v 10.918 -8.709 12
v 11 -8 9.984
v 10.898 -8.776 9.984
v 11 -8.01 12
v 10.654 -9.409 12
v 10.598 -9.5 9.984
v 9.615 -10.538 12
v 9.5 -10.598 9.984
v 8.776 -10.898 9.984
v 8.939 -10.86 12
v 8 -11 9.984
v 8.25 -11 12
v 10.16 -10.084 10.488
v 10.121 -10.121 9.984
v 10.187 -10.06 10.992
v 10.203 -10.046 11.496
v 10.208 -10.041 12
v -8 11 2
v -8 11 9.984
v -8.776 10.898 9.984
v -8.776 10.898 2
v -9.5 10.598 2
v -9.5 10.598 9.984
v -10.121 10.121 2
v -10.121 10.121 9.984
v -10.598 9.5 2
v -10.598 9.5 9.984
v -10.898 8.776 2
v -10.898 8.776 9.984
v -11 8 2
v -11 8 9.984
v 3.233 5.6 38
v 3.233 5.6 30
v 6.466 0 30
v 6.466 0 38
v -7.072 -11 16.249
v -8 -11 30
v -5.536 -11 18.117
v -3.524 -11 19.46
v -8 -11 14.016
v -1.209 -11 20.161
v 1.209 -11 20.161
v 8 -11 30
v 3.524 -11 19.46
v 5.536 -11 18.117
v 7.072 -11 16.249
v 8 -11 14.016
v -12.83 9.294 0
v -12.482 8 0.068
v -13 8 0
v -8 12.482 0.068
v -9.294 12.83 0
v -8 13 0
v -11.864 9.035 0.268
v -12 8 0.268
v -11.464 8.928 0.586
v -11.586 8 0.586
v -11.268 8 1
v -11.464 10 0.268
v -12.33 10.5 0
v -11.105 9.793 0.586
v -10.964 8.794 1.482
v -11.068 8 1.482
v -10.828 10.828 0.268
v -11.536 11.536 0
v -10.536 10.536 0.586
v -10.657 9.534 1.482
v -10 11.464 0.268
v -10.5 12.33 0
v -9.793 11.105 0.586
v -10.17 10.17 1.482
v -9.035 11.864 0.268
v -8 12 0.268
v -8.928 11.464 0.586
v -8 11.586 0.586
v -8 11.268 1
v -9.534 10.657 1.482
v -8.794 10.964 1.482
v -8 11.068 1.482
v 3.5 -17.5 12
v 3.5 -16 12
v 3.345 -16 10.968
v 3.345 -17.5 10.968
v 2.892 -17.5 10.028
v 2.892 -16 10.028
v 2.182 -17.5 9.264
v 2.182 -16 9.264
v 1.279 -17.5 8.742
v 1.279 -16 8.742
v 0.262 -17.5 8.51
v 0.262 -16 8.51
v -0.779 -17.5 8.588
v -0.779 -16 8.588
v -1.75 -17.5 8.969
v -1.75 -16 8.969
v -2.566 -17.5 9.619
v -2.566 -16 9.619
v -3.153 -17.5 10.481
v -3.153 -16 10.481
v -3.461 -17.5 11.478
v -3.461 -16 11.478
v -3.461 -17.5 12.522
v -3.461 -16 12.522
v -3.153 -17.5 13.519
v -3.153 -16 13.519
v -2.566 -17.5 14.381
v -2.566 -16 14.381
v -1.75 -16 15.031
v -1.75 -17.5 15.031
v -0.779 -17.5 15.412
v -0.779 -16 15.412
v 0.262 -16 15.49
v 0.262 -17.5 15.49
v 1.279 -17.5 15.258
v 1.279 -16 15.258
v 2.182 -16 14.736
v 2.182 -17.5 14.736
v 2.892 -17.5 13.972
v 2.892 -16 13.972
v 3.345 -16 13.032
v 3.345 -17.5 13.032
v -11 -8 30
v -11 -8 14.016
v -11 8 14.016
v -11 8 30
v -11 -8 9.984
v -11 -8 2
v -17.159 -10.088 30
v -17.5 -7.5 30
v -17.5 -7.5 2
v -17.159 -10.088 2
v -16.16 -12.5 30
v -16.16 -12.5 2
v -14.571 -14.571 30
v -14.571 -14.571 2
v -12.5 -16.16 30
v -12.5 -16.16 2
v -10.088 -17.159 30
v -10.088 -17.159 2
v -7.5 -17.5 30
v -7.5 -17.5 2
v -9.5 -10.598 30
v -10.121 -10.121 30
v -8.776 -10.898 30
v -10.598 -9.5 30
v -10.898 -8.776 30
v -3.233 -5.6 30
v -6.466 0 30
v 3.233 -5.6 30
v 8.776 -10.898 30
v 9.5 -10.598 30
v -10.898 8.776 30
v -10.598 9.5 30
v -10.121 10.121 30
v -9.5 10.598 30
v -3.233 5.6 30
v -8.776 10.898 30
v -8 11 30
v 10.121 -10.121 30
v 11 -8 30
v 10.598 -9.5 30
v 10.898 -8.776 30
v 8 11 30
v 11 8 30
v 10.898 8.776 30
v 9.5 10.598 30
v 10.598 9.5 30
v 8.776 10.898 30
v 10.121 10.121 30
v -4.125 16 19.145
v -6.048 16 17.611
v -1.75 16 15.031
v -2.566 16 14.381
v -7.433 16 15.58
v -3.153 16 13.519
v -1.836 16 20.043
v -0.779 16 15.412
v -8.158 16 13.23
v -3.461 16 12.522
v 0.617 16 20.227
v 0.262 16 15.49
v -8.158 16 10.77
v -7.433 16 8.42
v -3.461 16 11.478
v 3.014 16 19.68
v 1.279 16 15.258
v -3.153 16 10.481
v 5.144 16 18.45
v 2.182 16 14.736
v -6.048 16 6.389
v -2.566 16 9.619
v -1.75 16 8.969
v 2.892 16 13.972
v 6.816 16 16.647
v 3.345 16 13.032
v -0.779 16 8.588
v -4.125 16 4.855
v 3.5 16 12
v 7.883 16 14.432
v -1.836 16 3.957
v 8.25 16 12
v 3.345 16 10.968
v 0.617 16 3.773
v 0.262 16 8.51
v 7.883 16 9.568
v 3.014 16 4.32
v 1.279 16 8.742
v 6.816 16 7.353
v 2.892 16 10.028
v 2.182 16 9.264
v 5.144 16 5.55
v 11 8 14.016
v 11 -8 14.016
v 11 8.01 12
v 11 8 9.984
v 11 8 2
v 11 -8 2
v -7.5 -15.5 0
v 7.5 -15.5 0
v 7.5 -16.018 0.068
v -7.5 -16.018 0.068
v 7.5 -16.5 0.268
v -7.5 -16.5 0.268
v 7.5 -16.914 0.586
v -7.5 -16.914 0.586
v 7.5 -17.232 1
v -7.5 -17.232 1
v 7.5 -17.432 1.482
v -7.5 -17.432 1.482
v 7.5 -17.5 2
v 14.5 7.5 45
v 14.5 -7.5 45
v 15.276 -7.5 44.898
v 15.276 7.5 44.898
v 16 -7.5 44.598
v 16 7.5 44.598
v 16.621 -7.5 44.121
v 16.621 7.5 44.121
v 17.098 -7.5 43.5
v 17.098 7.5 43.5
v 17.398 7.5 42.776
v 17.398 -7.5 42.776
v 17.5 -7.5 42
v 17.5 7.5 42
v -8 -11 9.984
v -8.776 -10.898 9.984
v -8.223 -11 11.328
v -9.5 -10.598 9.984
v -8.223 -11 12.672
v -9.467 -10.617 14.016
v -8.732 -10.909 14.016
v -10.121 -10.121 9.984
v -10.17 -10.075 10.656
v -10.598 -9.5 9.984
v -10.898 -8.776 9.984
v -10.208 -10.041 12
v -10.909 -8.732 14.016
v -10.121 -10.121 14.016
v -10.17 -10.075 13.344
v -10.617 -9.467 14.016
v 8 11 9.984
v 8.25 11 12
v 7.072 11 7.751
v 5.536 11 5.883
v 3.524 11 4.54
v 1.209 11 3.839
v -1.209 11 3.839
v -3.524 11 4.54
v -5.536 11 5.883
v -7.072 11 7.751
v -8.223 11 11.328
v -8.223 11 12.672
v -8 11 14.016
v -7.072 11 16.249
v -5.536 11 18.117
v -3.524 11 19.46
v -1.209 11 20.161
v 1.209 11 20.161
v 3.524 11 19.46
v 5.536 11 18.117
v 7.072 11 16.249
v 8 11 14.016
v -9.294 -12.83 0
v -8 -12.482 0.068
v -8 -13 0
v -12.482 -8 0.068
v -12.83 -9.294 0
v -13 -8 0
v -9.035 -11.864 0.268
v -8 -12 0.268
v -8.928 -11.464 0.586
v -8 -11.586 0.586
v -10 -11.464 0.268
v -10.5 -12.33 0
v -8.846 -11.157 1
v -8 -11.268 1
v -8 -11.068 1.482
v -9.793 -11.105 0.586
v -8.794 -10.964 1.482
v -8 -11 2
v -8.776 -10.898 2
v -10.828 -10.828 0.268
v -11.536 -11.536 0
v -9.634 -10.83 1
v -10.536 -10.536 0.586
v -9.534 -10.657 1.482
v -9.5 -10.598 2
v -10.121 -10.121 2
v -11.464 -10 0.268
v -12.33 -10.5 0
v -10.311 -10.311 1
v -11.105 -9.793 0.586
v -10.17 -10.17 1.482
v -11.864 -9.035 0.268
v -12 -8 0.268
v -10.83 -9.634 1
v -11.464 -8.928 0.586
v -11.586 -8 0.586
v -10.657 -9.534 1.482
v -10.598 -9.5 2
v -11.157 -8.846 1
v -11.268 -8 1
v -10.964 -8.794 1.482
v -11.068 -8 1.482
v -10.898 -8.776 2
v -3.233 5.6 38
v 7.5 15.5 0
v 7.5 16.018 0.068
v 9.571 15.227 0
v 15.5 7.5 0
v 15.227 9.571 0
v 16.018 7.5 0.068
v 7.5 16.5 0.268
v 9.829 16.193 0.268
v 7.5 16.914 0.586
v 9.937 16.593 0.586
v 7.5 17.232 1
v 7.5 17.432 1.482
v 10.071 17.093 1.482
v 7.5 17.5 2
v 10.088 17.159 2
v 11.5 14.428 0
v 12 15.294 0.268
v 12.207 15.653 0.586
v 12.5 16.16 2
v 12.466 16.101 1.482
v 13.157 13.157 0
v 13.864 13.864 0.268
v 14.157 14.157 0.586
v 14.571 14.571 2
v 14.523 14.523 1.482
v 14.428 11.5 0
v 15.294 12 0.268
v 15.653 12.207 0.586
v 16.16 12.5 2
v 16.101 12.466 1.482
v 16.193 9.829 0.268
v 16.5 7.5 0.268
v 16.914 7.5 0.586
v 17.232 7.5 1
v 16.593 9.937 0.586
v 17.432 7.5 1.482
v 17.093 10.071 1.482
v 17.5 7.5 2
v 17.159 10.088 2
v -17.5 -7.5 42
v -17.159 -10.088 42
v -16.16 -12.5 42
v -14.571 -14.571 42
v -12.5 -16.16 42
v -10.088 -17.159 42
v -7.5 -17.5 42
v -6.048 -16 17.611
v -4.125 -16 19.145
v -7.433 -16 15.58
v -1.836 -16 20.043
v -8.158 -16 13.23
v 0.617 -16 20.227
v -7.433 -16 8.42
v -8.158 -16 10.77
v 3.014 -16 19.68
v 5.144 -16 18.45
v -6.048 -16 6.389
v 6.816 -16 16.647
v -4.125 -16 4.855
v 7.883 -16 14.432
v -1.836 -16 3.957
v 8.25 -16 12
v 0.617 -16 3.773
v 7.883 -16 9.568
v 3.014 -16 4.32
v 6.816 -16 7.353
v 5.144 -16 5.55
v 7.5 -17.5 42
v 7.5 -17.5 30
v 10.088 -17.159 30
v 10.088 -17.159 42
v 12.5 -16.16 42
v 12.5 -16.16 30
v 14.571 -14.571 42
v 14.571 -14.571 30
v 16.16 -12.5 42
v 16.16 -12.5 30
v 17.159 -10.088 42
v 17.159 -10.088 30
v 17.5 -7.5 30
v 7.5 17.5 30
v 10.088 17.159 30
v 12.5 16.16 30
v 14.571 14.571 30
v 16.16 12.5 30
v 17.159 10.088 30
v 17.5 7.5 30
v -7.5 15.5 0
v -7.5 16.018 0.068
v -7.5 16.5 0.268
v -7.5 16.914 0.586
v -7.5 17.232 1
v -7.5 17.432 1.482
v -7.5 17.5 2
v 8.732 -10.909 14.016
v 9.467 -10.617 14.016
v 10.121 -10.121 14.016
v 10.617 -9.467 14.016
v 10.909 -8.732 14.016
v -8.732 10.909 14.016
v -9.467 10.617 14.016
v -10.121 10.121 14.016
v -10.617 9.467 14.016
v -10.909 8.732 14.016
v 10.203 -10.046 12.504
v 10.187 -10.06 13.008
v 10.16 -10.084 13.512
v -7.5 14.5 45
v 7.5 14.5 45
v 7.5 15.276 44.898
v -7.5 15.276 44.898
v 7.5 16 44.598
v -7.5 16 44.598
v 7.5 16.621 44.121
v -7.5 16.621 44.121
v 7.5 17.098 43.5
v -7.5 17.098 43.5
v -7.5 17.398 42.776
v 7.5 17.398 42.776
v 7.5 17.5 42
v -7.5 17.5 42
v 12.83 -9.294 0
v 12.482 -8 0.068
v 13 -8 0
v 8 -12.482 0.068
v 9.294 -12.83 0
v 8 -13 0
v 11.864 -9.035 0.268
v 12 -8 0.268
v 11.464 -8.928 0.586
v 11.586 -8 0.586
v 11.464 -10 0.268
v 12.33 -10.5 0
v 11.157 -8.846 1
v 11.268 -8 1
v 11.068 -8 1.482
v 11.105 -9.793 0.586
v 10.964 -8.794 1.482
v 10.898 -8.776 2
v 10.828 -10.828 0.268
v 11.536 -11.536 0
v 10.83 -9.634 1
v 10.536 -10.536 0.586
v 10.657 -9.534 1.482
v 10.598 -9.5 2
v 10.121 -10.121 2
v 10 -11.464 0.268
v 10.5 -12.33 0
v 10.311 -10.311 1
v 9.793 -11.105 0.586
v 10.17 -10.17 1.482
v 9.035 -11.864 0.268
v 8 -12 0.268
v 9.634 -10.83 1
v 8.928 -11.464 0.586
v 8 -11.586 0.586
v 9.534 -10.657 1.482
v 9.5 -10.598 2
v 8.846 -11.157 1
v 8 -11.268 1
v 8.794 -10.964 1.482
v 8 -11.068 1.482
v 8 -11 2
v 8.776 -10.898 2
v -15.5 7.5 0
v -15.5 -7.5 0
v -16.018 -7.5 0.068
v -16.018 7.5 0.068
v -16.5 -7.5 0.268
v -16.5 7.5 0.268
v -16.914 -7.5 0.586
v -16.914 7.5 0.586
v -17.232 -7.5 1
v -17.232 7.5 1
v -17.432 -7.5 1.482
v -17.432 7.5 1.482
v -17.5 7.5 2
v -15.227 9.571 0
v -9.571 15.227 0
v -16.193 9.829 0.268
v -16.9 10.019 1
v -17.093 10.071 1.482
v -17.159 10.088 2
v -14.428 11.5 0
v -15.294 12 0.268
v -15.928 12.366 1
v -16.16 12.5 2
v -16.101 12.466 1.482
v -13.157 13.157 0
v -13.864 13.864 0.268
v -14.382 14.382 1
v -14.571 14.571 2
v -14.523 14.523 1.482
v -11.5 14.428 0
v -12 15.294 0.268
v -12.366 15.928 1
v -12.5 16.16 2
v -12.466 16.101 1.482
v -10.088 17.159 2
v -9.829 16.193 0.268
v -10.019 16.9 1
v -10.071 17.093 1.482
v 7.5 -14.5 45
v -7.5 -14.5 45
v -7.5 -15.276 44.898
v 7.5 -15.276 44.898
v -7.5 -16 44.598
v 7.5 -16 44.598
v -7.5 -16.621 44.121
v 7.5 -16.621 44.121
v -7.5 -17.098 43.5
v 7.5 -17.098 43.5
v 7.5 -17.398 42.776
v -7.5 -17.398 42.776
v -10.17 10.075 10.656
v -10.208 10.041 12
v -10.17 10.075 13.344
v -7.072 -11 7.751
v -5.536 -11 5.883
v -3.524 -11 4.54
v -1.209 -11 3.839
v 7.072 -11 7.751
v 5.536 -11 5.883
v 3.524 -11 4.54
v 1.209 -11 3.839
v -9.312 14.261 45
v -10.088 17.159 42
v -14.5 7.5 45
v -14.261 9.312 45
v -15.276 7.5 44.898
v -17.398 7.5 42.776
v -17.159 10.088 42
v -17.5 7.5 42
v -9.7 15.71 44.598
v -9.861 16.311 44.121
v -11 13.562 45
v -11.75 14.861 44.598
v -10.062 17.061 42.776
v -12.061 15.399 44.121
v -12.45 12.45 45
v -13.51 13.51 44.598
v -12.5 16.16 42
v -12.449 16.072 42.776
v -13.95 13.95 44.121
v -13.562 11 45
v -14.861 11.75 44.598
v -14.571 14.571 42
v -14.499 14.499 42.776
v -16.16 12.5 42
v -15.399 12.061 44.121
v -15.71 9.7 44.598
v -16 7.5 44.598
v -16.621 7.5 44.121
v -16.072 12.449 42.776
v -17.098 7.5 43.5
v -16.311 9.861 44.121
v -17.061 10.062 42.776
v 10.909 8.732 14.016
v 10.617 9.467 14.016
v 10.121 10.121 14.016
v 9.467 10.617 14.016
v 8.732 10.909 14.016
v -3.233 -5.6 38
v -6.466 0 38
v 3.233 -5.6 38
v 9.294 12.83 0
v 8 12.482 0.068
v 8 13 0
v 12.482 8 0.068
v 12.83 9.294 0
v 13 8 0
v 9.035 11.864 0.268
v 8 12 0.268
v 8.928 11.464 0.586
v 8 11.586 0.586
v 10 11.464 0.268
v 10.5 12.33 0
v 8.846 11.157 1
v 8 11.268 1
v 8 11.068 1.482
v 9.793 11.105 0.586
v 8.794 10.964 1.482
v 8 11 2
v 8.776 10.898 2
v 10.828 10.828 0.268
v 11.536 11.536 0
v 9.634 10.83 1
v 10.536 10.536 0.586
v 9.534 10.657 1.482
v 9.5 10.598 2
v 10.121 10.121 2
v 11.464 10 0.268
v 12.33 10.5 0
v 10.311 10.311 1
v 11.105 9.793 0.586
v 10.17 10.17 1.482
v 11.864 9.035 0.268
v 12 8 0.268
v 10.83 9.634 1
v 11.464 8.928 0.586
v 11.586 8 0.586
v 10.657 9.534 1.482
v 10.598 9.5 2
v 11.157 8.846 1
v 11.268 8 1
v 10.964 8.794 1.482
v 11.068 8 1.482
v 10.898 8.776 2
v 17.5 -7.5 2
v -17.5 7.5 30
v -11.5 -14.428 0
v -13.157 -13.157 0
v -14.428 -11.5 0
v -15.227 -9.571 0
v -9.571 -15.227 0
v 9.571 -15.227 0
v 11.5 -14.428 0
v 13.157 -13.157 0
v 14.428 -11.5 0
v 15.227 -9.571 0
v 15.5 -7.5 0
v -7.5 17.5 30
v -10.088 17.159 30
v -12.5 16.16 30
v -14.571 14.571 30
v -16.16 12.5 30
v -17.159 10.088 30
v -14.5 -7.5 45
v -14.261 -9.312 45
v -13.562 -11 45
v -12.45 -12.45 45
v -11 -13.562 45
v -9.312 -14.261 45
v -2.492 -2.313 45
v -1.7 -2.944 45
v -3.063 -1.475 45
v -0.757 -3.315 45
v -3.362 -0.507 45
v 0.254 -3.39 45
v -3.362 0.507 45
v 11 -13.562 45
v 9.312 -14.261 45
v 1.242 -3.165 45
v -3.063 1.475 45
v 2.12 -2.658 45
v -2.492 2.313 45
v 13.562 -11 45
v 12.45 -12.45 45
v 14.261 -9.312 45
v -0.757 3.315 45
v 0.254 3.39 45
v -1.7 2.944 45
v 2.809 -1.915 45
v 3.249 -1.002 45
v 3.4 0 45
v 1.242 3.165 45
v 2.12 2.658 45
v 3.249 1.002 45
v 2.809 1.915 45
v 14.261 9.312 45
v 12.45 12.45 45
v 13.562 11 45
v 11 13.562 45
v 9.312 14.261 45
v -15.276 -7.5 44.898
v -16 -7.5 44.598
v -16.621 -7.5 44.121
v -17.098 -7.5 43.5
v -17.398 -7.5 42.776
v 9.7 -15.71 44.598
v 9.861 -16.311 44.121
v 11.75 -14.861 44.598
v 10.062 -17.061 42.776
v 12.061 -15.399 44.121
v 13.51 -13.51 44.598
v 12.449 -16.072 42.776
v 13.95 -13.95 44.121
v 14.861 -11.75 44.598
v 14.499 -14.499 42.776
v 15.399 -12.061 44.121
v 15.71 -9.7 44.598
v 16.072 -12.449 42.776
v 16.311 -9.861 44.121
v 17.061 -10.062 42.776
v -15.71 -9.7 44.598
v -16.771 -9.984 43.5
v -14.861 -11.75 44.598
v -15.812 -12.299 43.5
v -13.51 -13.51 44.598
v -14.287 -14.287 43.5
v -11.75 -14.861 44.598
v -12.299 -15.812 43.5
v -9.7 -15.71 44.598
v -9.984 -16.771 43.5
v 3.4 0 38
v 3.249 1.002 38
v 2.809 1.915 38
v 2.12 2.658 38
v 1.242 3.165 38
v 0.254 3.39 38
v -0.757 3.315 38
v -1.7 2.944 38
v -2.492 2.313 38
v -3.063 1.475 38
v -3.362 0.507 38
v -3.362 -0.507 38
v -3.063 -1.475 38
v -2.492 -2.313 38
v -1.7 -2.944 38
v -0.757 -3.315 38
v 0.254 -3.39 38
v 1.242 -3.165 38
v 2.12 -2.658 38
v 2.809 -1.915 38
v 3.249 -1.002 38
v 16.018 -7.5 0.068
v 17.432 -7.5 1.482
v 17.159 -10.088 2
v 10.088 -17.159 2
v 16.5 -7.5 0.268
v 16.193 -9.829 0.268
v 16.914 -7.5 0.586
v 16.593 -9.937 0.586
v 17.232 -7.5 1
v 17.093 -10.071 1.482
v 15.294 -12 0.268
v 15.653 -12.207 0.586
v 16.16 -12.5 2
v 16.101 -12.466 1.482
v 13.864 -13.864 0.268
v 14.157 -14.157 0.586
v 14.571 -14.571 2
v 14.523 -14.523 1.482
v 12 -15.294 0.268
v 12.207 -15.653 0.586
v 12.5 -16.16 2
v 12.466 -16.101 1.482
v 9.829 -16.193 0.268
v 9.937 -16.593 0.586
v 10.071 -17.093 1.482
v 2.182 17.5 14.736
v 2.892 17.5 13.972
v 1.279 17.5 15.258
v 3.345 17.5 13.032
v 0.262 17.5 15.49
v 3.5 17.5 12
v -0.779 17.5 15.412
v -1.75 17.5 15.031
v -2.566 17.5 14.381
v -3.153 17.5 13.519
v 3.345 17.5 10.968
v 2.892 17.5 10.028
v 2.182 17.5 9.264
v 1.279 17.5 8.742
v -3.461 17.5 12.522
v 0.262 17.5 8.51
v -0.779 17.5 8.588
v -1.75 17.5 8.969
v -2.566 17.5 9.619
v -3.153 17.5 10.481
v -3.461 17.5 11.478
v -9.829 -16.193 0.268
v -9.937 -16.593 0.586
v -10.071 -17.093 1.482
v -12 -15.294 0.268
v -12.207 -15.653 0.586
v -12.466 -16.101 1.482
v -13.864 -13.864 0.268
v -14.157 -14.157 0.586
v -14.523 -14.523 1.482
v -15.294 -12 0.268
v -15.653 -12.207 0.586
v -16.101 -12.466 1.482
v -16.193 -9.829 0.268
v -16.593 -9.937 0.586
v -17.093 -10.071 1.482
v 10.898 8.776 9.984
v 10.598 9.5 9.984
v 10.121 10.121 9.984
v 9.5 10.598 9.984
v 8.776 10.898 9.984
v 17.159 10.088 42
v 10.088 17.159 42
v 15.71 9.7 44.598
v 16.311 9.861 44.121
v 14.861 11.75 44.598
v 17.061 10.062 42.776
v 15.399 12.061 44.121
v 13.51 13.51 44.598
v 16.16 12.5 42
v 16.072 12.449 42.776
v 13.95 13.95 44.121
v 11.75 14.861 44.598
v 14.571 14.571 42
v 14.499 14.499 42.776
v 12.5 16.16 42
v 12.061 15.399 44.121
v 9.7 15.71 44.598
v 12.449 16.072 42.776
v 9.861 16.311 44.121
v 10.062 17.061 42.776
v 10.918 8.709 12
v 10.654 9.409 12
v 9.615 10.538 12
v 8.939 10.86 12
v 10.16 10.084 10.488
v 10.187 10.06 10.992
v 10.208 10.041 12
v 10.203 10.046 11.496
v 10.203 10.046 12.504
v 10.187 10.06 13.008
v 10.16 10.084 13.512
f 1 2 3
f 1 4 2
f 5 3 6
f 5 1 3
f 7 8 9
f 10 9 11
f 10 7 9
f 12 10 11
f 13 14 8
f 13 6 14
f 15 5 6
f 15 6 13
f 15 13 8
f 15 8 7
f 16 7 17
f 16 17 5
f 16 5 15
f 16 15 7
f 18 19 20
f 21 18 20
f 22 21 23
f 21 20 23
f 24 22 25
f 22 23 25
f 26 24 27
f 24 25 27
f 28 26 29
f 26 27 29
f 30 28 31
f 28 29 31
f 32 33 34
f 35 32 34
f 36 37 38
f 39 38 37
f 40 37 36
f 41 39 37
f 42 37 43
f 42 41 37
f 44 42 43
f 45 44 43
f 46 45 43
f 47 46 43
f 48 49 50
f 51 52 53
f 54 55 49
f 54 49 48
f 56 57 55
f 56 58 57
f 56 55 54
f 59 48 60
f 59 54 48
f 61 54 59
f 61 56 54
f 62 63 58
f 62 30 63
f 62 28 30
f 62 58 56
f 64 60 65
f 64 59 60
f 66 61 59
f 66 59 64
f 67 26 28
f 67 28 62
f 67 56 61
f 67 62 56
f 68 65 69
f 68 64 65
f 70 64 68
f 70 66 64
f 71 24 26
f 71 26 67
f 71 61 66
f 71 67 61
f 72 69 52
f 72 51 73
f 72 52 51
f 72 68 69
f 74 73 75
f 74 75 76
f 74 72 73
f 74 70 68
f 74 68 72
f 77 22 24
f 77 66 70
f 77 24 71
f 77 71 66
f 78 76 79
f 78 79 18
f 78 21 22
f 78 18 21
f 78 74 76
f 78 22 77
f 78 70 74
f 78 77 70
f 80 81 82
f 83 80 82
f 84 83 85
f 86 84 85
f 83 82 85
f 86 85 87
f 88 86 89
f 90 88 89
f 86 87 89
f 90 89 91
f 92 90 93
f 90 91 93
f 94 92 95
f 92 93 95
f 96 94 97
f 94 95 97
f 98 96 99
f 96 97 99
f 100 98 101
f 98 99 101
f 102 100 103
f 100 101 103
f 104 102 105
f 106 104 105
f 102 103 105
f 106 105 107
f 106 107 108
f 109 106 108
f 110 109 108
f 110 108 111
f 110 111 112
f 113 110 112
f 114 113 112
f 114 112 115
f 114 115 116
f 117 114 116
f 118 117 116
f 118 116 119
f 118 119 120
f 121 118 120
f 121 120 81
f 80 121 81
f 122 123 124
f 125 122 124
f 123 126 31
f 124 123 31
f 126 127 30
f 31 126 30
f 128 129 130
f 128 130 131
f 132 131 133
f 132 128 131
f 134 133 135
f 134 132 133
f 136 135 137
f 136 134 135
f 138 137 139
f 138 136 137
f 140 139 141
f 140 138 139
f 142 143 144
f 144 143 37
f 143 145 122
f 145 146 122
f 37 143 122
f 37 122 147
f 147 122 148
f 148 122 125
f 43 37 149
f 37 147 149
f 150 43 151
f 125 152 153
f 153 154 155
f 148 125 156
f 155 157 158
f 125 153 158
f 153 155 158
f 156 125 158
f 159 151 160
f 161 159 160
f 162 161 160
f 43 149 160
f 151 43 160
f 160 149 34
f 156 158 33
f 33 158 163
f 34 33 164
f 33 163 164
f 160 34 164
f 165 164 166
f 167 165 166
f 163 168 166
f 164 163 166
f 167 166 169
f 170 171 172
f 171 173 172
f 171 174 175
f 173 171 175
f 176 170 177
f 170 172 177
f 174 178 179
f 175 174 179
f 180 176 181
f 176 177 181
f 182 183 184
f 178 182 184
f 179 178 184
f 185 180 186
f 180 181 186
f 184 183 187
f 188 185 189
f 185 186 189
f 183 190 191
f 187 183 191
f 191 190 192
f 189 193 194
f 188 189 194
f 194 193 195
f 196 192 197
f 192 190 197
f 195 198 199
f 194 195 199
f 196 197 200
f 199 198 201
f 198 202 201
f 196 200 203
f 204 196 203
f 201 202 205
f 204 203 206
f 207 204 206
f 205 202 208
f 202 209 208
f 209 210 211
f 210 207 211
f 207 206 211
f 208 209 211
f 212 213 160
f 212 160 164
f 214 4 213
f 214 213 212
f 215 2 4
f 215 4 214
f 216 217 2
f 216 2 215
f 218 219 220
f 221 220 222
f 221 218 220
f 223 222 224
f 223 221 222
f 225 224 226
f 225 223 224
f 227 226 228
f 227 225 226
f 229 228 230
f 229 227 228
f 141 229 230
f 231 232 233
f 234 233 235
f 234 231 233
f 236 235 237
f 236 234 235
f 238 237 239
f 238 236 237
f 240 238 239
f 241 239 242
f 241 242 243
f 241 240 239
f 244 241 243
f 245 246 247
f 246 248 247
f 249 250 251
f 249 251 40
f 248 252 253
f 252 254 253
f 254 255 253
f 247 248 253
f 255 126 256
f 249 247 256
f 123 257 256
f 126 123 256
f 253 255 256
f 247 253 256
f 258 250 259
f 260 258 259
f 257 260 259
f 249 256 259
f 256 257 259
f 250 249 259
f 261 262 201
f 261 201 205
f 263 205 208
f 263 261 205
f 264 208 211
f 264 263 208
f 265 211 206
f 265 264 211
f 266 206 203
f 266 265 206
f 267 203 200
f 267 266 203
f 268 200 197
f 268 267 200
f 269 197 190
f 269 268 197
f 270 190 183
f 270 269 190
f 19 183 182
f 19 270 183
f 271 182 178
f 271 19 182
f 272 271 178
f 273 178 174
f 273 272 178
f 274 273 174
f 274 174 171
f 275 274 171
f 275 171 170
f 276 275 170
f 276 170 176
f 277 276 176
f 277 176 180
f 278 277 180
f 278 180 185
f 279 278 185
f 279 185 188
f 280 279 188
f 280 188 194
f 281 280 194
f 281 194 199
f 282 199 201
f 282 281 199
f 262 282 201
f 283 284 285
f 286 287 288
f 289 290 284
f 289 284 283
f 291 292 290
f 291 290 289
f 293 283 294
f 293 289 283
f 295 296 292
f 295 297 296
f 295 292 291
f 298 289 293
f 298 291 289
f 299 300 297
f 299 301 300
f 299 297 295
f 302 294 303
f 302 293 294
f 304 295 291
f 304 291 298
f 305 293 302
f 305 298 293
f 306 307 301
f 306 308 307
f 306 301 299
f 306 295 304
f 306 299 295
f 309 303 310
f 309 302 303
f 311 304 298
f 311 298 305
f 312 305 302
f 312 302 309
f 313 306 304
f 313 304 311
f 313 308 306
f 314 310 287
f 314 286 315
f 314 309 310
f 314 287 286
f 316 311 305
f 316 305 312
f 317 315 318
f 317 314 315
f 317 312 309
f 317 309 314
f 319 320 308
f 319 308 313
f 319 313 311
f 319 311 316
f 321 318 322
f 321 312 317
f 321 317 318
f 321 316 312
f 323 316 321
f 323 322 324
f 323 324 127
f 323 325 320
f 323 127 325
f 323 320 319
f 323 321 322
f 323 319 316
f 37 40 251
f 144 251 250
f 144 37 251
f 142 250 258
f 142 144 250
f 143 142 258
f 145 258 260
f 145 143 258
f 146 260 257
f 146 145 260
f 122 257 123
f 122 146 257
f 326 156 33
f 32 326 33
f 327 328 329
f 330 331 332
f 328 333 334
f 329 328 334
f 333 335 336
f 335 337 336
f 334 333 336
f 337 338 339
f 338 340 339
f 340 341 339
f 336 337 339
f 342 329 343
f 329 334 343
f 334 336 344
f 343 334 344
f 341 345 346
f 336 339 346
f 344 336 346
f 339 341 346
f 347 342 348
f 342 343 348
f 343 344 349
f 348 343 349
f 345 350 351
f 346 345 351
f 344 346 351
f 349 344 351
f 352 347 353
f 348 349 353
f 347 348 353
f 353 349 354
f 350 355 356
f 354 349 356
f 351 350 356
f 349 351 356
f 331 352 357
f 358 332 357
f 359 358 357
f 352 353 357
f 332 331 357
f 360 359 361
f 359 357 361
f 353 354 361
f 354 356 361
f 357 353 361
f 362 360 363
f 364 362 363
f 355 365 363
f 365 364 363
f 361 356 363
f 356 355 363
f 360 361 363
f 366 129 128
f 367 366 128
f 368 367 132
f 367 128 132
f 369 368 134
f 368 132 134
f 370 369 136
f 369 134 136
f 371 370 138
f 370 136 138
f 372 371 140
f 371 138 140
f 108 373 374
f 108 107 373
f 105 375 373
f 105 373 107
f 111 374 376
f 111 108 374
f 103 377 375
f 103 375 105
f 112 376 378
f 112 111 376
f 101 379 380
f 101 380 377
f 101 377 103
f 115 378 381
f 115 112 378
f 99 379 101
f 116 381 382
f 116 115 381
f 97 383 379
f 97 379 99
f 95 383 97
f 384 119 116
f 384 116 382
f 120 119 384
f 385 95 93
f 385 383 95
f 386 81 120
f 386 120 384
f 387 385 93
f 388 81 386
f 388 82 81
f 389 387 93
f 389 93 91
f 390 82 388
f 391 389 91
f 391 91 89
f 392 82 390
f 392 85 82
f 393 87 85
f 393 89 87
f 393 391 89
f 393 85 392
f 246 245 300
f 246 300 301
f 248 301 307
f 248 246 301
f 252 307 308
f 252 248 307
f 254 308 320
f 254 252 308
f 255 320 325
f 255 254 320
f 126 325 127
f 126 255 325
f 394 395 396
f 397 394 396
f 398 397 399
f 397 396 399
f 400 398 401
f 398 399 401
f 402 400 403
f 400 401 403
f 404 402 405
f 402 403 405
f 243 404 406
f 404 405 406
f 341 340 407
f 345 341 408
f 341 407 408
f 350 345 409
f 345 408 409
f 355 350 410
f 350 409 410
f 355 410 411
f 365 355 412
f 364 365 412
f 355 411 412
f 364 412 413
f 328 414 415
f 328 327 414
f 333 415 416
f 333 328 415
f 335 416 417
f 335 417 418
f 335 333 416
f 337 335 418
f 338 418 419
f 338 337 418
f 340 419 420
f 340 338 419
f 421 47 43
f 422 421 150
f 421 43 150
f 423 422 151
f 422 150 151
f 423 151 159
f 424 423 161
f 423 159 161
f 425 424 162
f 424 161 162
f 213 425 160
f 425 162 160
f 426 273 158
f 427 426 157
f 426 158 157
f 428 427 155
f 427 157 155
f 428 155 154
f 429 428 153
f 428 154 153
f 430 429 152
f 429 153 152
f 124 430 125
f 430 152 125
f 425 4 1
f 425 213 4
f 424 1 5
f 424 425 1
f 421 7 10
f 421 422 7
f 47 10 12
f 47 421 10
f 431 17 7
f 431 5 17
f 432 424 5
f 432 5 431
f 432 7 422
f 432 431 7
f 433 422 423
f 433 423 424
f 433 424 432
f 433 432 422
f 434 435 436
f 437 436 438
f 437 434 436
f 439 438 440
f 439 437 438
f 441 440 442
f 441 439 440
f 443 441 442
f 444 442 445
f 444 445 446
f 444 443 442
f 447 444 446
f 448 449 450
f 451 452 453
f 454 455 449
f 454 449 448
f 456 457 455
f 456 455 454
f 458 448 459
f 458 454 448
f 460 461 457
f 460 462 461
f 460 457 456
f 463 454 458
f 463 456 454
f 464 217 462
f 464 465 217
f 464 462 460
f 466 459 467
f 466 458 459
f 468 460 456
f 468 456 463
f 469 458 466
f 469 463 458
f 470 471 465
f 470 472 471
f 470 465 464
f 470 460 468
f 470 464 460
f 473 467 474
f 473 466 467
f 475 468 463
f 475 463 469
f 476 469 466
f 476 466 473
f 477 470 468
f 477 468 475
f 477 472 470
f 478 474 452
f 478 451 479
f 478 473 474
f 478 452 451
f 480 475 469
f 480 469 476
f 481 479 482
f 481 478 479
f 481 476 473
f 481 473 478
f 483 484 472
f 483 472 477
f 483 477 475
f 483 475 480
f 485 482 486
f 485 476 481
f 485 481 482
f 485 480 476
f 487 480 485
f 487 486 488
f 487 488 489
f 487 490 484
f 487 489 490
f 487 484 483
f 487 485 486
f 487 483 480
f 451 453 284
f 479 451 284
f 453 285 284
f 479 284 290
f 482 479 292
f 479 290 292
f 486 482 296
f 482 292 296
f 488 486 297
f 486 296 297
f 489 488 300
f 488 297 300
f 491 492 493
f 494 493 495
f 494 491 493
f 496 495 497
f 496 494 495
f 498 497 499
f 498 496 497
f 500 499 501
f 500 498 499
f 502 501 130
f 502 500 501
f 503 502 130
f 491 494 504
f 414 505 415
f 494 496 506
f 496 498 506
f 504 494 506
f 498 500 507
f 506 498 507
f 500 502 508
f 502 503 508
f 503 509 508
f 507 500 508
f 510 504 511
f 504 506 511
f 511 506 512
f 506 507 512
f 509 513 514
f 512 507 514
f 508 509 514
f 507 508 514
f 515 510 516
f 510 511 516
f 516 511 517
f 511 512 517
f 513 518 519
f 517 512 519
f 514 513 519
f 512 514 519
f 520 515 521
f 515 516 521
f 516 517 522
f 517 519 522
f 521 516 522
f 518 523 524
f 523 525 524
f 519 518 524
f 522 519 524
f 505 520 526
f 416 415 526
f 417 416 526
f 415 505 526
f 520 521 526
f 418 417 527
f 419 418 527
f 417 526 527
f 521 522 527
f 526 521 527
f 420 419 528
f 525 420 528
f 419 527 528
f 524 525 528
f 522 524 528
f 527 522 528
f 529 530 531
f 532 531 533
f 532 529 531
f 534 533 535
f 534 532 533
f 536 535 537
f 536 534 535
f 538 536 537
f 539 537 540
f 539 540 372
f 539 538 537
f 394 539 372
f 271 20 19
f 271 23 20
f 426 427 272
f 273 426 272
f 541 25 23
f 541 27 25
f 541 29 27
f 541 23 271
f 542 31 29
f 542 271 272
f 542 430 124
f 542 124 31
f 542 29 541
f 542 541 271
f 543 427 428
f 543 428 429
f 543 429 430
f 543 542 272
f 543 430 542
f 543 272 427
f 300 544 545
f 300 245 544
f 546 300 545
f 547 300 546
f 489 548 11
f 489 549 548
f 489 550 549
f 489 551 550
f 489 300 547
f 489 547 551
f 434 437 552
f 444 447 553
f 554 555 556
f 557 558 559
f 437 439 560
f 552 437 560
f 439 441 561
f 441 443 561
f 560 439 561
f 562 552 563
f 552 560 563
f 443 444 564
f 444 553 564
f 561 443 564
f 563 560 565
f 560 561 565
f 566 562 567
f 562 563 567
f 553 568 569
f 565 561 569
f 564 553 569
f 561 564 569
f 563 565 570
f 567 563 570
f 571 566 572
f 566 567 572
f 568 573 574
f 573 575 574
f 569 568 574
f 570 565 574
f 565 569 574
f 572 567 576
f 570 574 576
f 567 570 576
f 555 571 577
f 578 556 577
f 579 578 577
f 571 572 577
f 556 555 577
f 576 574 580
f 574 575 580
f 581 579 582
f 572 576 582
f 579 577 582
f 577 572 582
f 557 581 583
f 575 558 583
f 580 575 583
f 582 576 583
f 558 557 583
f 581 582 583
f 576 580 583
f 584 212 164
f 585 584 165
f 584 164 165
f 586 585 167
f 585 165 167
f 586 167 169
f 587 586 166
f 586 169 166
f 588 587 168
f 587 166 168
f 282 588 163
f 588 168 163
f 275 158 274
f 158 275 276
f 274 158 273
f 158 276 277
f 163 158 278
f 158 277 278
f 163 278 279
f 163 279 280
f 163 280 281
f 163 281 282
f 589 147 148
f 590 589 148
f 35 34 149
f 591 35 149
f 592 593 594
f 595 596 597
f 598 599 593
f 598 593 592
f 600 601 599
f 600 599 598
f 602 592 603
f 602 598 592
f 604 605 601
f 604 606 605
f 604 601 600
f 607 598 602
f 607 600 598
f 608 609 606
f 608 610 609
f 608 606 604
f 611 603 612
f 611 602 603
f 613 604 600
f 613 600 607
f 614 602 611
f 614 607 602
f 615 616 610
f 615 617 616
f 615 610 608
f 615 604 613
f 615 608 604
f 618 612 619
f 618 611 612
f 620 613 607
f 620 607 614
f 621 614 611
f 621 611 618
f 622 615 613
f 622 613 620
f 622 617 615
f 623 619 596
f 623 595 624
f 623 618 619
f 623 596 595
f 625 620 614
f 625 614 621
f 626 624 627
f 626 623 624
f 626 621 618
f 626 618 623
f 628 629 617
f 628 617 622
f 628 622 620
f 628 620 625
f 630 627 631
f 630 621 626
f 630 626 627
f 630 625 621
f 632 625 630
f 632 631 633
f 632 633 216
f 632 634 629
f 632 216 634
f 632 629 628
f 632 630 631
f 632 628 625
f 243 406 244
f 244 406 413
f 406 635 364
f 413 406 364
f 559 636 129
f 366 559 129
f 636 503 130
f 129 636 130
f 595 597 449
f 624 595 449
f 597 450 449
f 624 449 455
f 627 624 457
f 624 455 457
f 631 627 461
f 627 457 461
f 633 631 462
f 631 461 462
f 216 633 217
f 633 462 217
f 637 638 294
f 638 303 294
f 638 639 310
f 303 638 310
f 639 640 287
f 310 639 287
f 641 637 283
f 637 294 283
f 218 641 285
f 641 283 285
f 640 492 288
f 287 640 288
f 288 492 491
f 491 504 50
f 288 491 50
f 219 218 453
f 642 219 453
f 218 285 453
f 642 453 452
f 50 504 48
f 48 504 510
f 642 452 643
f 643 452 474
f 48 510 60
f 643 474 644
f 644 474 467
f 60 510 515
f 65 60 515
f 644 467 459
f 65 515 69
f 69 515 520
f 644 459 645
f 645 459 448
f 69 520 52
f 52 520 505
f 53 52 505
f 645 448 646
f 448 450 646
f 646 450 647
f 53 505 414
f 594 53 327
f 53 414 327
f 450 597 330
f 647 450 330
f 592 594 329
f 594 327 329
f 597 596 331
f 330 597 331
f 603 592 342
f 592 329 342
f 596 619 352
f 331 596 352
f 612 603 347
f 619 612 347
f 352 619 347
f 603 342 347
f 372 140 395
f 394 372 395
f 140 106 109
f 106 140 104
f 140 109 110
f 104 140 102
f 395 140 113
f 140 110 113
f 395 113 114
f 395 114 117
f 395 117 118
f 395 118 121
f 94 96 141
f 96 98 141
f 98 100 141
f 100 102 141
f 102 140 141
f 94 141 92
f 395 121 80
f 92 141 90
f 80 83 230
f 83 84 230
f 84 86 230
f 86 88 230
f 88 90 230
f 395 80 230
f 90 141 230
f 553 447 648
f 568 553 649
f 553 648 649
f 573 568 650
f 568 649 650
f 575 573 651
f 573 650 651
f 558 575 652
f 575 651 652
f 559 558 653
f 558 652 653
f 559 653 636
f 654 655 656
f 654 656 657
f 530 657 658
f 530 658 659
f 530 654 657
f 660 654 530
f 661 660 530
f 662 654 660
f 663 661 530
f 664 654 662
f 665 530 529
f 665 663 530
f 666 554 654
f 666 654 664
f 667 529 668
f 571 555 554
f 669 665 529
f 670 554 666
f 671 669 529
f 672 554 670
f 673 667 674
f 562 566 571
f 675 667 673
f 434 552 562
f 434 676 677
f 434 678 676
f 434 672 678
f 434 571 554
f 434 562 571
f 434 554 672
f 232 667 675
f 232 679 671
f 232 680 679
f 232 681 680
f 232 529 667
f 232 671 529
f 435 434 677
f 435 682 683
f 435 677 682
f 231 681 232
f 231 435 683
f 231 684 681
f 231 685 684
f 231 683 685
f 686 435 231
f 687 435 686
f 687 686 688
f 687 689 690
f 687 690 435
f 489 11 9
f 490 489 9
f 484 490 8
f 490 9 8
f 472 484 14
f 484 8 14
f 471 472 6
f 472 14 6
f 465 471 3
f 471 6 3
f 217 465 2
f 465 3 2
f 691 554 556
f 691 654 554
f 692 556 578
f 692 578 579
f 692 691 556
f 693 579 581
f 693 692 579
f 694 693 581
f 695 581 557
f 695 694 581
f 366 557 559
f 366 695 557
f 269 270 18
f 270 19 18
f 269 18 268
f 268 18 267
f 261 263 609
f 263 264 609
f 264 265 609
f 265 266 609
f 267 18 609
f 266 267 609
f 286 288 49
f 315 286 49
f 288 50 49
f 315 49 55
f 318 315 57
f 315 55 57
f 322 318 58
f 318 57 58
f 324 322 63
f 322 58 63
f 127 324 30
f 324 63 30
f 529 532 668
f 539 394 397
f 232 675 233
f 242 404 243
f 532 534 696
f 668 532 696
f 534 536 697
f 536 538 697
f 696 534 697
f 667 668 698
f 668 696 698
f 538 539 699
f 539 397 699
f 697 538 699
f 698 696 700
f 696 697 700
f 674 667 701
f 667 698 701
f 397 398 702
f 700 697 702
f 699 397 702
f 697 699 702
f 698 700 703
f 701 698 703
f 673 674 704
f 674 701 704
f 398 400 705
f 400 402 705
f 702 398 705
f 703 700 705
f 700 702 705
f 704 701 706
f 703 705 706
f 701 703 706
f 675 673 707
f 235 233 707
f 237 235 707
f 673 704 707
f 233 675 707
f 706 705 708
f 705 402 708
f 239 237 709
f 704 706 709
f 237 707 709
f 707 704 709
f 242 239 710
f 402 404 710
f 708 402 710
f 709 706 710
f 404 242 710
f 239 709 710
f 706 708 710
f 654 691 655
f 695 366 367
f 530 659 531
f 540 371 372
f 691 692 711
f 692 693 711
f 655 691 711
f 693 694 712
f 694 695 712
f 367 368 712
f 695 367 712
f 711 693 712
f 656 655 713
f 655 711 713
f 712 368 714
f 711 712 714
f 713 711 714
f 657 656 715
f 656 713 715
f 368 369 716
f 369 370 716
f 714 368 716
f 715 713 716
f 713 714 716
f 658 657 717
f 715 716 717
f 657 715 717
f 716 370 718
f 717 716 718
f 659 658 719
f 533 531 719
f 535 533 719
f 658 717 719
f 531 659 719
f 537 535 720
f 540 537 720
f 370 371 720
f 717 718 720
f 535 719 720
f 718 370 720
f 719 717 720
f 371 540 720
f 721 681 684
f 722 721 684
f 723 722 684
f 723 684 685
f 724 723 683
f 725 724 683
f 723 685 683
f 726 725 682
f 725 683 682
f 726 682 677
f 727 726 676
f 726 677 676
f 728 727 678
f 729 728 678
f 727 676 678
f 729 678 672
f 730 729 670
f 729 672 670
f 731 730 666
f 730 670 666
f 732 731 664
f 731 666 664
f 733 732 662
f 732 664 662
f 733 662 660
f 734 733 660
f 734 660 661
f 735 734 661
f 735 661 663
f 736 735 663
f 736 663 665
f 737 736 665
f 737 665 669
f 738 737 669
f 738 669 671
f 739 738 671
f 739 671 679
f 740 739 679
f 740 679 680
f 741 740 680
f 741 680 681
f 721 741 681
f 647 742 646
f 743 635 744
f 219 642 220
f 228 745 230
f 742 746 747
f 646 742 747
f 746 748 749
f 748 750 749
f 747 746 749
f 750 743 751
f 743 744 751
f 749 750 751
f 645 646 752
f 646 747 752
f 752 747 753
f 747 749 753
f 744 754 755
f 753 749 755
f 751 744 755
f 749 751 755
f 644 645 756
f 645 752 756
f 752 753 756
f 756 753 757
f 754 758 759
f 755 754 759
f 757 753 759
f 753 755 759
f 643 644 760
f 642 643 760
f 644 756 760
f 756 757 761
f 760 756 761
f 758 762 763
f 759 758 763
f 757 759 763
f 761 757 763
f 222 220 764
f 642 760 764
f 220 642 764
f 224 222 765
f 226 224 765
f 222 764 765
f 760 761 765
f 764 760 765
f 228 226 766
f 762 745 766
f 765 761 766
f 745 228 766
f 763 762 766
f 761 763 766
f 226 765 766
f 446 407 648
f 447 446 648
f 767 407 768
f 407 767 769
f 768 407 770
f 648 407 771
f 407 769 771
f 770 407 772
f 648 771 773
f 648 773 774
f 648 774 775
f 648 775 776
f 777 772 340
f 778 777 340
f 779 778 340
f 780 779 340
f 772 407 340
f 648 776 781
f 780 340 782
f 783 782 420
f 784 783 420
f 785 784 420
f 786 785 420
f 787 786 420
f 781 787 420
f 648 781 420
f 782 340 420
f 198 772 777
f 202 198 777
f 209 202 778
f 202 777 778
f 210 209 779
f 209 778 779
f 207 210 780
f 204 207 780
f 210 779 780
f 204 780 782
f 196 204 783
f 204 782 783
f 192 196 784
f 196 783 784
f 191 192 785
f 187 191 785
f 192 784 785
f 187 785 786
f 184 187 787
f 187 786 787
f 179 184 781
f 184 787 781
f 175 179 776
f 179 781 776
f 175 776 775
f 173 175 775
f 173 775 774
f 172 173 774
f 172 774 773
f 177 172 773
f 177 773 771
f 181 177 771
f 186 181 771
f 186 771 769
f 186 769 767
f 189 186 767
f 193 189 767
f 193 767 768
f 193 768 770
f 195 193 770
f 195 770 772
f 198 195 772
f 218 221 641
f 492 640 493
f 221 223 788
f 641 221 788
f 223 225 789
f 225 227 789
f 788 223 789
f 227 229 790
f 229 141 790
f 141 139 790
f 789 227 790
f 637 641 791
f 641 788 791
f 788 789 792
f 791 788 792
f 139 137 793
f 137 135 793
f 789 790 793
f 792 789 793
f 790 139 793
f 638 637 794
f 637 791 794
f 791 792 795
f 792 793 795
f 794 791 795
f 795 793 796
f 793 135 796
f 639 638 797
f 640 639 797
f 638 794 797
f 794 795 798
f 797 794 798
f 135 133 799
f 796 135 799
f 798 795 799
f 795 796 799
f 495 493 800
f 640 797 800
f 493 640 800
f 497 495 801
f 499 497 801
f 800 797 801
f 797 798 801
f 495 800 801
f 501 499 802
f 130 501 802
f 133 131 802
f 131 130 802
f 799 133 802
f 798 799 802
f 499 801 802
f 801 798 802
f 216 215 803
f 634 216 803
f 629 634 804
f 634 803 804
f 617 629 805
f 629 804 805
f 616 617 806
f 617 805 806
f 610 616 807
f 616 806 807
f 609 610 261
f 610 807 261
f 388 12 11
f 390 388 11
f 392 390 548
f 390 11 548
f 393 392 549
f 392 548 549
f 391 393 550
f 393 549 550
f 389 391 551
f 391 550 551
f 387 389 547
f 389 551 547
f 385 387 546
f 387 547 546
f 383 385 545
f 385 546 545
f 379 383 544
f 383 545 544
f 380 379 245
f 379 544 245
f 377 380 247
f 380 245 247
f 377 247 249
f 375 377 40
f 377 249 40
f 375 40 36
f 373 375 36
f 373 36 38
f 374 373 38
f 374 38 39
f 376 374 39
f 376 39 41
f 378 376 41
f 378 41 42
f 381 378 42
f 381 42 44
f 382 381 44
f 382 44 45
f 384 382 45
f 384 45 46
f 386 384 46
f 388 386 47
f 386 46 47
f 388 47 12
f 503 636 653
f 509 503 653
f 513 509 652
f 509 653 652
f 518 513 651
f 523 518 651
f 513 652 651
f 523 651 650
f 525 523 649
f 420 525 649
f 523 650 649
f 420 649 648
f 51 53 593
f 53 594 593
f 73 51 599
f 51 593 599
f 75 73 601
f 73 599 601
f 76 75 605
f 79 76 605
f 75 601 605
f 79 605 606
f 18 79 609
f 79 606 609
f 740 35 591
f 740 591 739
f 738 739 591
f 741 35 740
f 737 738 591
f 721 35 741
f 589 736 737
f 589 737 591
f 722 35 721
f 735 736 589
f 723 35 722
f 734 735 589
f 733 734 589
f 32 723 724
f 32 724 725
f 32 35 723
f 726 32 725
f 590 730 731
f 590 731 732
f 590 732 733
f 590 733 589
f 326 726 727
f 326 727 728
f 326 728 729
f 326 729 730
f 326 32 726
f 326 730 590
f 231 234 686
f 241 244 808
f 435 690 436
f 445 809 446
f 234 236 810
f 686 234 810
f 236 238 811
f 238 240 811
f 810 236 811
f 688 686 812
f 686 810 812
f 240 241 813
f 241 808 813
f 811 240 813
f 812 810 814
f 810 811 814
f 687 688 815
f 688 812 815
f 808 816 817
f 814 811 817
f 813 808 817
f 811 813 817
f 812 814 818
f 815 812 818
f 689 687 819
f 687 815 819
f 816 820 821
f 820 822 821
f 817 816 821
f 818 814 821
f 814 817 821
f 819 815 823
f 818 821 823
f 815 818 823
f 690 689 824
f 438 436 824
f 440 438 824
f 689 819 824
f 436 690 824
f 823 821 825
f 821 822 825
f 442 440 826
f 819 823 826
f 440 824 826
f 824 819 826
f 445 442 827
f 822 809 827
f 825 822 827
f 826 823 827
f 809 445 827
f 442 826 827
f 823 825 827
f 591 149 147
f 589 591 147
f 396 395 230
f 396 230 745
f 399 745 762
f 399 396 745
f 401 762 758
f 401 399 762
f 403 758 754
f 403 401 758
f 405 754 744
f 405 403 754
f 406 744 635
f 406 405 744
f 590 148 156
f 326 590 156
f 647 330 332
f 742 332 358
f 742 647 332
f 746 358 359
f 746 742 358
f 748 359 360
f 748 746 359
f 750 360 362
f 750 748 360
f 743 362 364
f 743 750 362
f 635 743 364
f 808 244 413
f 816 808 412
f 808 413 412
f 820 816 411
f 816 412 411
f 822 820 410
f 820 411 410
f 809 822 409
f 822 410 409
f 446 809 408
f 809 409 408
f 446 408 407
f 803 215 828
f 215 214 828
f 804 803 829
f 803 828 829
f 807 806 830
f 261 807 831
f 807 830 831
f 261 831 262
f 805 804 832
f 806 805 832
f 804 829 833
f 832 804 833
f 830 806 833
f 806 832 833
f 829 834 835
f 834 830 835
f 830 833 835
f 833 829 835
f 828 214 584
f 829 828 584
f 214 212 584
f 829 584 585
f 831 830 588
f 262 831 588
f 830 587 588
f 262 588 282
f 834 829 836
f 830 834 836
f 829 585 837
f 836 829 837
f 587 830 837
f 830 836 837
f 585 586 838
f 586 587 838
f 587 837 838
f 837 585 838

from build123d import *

# Parameters (mm, degrees)
SKETCH1_W                = 35
SKETCH1_H                = 35
SKETCH1_W_2              = 22
SKETCH1_H_2              = 22
BOSS_EXTRUDE1_DEPTH      = 30
SKETCH3_R                = 3.5
CUT_EXTRUDE2_DEPTH       = 50.307707308
SKETCH4_R                = 8.25
CUT_EXTRUDE3_DEPTH       = 5
FILLET1_R                = 10
FILLET4_R                = 2
FILLET5_R                = 3
NUT_START                = 15
NUT_RETENTION_AREA_DEPTH = 15
CUT_EXTRUDE5_DEPTH       = 8
SKETCH7_R                = 3.4
CUT_EXTRUDE6_DEPTH       = 52.356596548
FILLET6_R                = 3
FILLET7_R                = 2


with BuildPart() as part:
    # Sketch1 → Boss-Extrude1 (new body)
    with BuildSketch(Plane.XY):
        Rectangle(SKETCH1_W, SKETCH1_H)
        Rectangle(SKETCH1_W_2, SKETCH1_H_2, mode=Mode.SUBTRACT)
    extrude(amount=BOSS_EXTRUDE1_DEPTH)

    # Sketch3 → Cut-Extrude2 (cut, through all)
    with BuildSketch(Plane(origin=(0, 17.5, 0), x_dir=(1, 0, 0), z_dir=(0, 1, 0))):
        with Locations((0, -12)):
            Circle(SKETCH3_R)
    extrude(amount=-CUT_EXTRUDE2_DEPTH, mode=Mode.SUBTRACT)

    # Sketch4 → Cut-Extrude3 (cut)
    with BuildSketch(Plane(origin=(0, -11, 0), x_dir=(1, 0, 0), z_dir=(0, 1, 0))):
        with Locations((0, -12)):
            Circle(SKETCH4_R)
    cut_extrude3 = extrude(amount=-CUT_EXTRUDE3_DEPTH, mode=Mode.SUBTRACT)

    # Mirror2: Cut-Extrude3 across plane
    add(cut_extrude3.mirror(Plane.ZX), mode=Mode.SUBTRACT)

    # Fillet1
    fillet1_edges = [part.edges().sort_by_distance(p)[0] for p in [
        (17.5, 17.5, 15),
        (17.5, -17.5, 15),
        (-17.5, -17.5, 15),
        (-17.5, 17.5, 15),
    ]]
    fillet(fillet1_edges, radius=FILLET1_R)

    # Fillet4
    fillet4_edges = [part.edges().sort_by_distance(p)[0] for p in [
        (14.571067812, 14.571067812, 0),
        (17.5, 0, 0),
        (14.571067812, -14.571067812, 0),
        (0, -17.5, 0),
        (-14.571067812, -14.571067812, 0),
        (-17.5, 0, 0),
        (-14.571067812, 14.571067812, 0),
        (0, 17.5, 0),
    ]]
    fillet(fillet4_edges, radius=FILLET4_R)

    # Fillet5
    fillet5_edges = [part.edges().sort_by_distance(p)[0] for p in [
        (-11, 11, 15),
        (11, 11, 15),
        (11, -11, 15),
        (-11, -11, 15),
    ]]
    fillet(fillet5_edges, radius=FILLET5_R)

    # Sketch6 → Nut Retention Area (add)
    with BuildSketch(Plane.XY.offset(30).offset(NUT_START)):
        with BuildLine():
            Line((7.5, 17.5), (-7.5, 17.5))
            ThreePointArc((-7.5, 17.5), (-14.571067812, 14.571067812), (-17.5, 7.5))
            Line((-17.5, 7.5), (-17.5, -7.5))
            ThreePointArc((-17.5, -7.5), (-14.571067812, -14.571067812), (-7.5, -17.5))
            Line((-7.5, -17.5), (7.5, -17.5))
            ThreePointArc((7.5, -17.5), (14.571067812, -14.571067812), (17.5, -7.5))
            Line((17.5, -7.5), (17.5, 7.5))
            ThreePointArc((17.5, 7.5), (14.571067812, 14.571067812), (7.5, 17.5))
        make_face()
    extrude(amount=-NUT_RETENTION_AREA_DEPTH)

    # Sketch8 → Cut-Extrude5 (cut)
    with BuildSketch(Plane(origin=(0, 0, 30), x_dir=(-1, 0, 0), z_dir=(0, 0, -1))):
        Polygon((3.233161507, -5.6), (6.466323015, 0), (3.233161507, 5.6), (-3.233161507, 5.6), (-6.466323015, 0), (-3.233161507, -5.6), align=None)
    extrude(amount=-CUT_EXTRUDE5_DEPTH, mode=Mode.SUBTRACT)

    # Sketch7 → Cut-Extrude6 (cut, through all)
    with BuildSketch(Plane.XY.offset(45)):
        Circle(SKETCH7_R)
    extrude(amount=-CUT_EXTRUDE6_DEPTH, mode=Mode.SUBTRACT)

    # Fillet6
    fillet6_edges = [part.edges().sort_by_distance(p)[0] for p in [
        (0, 17.5, 45),
        (14.571067812, 14.571067812, 45),
        (17.5, 0, 45),
        (14.571067812, -14.571067812, 45),
        (0, -17.5, 45),
        (-14.571067812, -14.571067812, 45),
        (-17.5, 0, 45),
        (-14.571067812, 14.571067812, 45),
    ]]
    fillet(fillet6_edges, radius=FILLET6_R)

    # Fillet7
    fillet7_edges = [part.edges().sort_by_distance(p)[0] for p in [
        (10.121320344, 10.121320344, 0),
        (11, 0, 0),
        (10.121320344, -10.121320344, 0),
        (0, -11, 0),
        (-10.121320344, -10.121320344, 0),
        (-11, 0, 0),
        (-10.121320344, 10.121320344, 0),
        (0, 11, 0),
    ]]
    fillet(fillet7_edges, radius=FILLET7_R)


solid = part.part
